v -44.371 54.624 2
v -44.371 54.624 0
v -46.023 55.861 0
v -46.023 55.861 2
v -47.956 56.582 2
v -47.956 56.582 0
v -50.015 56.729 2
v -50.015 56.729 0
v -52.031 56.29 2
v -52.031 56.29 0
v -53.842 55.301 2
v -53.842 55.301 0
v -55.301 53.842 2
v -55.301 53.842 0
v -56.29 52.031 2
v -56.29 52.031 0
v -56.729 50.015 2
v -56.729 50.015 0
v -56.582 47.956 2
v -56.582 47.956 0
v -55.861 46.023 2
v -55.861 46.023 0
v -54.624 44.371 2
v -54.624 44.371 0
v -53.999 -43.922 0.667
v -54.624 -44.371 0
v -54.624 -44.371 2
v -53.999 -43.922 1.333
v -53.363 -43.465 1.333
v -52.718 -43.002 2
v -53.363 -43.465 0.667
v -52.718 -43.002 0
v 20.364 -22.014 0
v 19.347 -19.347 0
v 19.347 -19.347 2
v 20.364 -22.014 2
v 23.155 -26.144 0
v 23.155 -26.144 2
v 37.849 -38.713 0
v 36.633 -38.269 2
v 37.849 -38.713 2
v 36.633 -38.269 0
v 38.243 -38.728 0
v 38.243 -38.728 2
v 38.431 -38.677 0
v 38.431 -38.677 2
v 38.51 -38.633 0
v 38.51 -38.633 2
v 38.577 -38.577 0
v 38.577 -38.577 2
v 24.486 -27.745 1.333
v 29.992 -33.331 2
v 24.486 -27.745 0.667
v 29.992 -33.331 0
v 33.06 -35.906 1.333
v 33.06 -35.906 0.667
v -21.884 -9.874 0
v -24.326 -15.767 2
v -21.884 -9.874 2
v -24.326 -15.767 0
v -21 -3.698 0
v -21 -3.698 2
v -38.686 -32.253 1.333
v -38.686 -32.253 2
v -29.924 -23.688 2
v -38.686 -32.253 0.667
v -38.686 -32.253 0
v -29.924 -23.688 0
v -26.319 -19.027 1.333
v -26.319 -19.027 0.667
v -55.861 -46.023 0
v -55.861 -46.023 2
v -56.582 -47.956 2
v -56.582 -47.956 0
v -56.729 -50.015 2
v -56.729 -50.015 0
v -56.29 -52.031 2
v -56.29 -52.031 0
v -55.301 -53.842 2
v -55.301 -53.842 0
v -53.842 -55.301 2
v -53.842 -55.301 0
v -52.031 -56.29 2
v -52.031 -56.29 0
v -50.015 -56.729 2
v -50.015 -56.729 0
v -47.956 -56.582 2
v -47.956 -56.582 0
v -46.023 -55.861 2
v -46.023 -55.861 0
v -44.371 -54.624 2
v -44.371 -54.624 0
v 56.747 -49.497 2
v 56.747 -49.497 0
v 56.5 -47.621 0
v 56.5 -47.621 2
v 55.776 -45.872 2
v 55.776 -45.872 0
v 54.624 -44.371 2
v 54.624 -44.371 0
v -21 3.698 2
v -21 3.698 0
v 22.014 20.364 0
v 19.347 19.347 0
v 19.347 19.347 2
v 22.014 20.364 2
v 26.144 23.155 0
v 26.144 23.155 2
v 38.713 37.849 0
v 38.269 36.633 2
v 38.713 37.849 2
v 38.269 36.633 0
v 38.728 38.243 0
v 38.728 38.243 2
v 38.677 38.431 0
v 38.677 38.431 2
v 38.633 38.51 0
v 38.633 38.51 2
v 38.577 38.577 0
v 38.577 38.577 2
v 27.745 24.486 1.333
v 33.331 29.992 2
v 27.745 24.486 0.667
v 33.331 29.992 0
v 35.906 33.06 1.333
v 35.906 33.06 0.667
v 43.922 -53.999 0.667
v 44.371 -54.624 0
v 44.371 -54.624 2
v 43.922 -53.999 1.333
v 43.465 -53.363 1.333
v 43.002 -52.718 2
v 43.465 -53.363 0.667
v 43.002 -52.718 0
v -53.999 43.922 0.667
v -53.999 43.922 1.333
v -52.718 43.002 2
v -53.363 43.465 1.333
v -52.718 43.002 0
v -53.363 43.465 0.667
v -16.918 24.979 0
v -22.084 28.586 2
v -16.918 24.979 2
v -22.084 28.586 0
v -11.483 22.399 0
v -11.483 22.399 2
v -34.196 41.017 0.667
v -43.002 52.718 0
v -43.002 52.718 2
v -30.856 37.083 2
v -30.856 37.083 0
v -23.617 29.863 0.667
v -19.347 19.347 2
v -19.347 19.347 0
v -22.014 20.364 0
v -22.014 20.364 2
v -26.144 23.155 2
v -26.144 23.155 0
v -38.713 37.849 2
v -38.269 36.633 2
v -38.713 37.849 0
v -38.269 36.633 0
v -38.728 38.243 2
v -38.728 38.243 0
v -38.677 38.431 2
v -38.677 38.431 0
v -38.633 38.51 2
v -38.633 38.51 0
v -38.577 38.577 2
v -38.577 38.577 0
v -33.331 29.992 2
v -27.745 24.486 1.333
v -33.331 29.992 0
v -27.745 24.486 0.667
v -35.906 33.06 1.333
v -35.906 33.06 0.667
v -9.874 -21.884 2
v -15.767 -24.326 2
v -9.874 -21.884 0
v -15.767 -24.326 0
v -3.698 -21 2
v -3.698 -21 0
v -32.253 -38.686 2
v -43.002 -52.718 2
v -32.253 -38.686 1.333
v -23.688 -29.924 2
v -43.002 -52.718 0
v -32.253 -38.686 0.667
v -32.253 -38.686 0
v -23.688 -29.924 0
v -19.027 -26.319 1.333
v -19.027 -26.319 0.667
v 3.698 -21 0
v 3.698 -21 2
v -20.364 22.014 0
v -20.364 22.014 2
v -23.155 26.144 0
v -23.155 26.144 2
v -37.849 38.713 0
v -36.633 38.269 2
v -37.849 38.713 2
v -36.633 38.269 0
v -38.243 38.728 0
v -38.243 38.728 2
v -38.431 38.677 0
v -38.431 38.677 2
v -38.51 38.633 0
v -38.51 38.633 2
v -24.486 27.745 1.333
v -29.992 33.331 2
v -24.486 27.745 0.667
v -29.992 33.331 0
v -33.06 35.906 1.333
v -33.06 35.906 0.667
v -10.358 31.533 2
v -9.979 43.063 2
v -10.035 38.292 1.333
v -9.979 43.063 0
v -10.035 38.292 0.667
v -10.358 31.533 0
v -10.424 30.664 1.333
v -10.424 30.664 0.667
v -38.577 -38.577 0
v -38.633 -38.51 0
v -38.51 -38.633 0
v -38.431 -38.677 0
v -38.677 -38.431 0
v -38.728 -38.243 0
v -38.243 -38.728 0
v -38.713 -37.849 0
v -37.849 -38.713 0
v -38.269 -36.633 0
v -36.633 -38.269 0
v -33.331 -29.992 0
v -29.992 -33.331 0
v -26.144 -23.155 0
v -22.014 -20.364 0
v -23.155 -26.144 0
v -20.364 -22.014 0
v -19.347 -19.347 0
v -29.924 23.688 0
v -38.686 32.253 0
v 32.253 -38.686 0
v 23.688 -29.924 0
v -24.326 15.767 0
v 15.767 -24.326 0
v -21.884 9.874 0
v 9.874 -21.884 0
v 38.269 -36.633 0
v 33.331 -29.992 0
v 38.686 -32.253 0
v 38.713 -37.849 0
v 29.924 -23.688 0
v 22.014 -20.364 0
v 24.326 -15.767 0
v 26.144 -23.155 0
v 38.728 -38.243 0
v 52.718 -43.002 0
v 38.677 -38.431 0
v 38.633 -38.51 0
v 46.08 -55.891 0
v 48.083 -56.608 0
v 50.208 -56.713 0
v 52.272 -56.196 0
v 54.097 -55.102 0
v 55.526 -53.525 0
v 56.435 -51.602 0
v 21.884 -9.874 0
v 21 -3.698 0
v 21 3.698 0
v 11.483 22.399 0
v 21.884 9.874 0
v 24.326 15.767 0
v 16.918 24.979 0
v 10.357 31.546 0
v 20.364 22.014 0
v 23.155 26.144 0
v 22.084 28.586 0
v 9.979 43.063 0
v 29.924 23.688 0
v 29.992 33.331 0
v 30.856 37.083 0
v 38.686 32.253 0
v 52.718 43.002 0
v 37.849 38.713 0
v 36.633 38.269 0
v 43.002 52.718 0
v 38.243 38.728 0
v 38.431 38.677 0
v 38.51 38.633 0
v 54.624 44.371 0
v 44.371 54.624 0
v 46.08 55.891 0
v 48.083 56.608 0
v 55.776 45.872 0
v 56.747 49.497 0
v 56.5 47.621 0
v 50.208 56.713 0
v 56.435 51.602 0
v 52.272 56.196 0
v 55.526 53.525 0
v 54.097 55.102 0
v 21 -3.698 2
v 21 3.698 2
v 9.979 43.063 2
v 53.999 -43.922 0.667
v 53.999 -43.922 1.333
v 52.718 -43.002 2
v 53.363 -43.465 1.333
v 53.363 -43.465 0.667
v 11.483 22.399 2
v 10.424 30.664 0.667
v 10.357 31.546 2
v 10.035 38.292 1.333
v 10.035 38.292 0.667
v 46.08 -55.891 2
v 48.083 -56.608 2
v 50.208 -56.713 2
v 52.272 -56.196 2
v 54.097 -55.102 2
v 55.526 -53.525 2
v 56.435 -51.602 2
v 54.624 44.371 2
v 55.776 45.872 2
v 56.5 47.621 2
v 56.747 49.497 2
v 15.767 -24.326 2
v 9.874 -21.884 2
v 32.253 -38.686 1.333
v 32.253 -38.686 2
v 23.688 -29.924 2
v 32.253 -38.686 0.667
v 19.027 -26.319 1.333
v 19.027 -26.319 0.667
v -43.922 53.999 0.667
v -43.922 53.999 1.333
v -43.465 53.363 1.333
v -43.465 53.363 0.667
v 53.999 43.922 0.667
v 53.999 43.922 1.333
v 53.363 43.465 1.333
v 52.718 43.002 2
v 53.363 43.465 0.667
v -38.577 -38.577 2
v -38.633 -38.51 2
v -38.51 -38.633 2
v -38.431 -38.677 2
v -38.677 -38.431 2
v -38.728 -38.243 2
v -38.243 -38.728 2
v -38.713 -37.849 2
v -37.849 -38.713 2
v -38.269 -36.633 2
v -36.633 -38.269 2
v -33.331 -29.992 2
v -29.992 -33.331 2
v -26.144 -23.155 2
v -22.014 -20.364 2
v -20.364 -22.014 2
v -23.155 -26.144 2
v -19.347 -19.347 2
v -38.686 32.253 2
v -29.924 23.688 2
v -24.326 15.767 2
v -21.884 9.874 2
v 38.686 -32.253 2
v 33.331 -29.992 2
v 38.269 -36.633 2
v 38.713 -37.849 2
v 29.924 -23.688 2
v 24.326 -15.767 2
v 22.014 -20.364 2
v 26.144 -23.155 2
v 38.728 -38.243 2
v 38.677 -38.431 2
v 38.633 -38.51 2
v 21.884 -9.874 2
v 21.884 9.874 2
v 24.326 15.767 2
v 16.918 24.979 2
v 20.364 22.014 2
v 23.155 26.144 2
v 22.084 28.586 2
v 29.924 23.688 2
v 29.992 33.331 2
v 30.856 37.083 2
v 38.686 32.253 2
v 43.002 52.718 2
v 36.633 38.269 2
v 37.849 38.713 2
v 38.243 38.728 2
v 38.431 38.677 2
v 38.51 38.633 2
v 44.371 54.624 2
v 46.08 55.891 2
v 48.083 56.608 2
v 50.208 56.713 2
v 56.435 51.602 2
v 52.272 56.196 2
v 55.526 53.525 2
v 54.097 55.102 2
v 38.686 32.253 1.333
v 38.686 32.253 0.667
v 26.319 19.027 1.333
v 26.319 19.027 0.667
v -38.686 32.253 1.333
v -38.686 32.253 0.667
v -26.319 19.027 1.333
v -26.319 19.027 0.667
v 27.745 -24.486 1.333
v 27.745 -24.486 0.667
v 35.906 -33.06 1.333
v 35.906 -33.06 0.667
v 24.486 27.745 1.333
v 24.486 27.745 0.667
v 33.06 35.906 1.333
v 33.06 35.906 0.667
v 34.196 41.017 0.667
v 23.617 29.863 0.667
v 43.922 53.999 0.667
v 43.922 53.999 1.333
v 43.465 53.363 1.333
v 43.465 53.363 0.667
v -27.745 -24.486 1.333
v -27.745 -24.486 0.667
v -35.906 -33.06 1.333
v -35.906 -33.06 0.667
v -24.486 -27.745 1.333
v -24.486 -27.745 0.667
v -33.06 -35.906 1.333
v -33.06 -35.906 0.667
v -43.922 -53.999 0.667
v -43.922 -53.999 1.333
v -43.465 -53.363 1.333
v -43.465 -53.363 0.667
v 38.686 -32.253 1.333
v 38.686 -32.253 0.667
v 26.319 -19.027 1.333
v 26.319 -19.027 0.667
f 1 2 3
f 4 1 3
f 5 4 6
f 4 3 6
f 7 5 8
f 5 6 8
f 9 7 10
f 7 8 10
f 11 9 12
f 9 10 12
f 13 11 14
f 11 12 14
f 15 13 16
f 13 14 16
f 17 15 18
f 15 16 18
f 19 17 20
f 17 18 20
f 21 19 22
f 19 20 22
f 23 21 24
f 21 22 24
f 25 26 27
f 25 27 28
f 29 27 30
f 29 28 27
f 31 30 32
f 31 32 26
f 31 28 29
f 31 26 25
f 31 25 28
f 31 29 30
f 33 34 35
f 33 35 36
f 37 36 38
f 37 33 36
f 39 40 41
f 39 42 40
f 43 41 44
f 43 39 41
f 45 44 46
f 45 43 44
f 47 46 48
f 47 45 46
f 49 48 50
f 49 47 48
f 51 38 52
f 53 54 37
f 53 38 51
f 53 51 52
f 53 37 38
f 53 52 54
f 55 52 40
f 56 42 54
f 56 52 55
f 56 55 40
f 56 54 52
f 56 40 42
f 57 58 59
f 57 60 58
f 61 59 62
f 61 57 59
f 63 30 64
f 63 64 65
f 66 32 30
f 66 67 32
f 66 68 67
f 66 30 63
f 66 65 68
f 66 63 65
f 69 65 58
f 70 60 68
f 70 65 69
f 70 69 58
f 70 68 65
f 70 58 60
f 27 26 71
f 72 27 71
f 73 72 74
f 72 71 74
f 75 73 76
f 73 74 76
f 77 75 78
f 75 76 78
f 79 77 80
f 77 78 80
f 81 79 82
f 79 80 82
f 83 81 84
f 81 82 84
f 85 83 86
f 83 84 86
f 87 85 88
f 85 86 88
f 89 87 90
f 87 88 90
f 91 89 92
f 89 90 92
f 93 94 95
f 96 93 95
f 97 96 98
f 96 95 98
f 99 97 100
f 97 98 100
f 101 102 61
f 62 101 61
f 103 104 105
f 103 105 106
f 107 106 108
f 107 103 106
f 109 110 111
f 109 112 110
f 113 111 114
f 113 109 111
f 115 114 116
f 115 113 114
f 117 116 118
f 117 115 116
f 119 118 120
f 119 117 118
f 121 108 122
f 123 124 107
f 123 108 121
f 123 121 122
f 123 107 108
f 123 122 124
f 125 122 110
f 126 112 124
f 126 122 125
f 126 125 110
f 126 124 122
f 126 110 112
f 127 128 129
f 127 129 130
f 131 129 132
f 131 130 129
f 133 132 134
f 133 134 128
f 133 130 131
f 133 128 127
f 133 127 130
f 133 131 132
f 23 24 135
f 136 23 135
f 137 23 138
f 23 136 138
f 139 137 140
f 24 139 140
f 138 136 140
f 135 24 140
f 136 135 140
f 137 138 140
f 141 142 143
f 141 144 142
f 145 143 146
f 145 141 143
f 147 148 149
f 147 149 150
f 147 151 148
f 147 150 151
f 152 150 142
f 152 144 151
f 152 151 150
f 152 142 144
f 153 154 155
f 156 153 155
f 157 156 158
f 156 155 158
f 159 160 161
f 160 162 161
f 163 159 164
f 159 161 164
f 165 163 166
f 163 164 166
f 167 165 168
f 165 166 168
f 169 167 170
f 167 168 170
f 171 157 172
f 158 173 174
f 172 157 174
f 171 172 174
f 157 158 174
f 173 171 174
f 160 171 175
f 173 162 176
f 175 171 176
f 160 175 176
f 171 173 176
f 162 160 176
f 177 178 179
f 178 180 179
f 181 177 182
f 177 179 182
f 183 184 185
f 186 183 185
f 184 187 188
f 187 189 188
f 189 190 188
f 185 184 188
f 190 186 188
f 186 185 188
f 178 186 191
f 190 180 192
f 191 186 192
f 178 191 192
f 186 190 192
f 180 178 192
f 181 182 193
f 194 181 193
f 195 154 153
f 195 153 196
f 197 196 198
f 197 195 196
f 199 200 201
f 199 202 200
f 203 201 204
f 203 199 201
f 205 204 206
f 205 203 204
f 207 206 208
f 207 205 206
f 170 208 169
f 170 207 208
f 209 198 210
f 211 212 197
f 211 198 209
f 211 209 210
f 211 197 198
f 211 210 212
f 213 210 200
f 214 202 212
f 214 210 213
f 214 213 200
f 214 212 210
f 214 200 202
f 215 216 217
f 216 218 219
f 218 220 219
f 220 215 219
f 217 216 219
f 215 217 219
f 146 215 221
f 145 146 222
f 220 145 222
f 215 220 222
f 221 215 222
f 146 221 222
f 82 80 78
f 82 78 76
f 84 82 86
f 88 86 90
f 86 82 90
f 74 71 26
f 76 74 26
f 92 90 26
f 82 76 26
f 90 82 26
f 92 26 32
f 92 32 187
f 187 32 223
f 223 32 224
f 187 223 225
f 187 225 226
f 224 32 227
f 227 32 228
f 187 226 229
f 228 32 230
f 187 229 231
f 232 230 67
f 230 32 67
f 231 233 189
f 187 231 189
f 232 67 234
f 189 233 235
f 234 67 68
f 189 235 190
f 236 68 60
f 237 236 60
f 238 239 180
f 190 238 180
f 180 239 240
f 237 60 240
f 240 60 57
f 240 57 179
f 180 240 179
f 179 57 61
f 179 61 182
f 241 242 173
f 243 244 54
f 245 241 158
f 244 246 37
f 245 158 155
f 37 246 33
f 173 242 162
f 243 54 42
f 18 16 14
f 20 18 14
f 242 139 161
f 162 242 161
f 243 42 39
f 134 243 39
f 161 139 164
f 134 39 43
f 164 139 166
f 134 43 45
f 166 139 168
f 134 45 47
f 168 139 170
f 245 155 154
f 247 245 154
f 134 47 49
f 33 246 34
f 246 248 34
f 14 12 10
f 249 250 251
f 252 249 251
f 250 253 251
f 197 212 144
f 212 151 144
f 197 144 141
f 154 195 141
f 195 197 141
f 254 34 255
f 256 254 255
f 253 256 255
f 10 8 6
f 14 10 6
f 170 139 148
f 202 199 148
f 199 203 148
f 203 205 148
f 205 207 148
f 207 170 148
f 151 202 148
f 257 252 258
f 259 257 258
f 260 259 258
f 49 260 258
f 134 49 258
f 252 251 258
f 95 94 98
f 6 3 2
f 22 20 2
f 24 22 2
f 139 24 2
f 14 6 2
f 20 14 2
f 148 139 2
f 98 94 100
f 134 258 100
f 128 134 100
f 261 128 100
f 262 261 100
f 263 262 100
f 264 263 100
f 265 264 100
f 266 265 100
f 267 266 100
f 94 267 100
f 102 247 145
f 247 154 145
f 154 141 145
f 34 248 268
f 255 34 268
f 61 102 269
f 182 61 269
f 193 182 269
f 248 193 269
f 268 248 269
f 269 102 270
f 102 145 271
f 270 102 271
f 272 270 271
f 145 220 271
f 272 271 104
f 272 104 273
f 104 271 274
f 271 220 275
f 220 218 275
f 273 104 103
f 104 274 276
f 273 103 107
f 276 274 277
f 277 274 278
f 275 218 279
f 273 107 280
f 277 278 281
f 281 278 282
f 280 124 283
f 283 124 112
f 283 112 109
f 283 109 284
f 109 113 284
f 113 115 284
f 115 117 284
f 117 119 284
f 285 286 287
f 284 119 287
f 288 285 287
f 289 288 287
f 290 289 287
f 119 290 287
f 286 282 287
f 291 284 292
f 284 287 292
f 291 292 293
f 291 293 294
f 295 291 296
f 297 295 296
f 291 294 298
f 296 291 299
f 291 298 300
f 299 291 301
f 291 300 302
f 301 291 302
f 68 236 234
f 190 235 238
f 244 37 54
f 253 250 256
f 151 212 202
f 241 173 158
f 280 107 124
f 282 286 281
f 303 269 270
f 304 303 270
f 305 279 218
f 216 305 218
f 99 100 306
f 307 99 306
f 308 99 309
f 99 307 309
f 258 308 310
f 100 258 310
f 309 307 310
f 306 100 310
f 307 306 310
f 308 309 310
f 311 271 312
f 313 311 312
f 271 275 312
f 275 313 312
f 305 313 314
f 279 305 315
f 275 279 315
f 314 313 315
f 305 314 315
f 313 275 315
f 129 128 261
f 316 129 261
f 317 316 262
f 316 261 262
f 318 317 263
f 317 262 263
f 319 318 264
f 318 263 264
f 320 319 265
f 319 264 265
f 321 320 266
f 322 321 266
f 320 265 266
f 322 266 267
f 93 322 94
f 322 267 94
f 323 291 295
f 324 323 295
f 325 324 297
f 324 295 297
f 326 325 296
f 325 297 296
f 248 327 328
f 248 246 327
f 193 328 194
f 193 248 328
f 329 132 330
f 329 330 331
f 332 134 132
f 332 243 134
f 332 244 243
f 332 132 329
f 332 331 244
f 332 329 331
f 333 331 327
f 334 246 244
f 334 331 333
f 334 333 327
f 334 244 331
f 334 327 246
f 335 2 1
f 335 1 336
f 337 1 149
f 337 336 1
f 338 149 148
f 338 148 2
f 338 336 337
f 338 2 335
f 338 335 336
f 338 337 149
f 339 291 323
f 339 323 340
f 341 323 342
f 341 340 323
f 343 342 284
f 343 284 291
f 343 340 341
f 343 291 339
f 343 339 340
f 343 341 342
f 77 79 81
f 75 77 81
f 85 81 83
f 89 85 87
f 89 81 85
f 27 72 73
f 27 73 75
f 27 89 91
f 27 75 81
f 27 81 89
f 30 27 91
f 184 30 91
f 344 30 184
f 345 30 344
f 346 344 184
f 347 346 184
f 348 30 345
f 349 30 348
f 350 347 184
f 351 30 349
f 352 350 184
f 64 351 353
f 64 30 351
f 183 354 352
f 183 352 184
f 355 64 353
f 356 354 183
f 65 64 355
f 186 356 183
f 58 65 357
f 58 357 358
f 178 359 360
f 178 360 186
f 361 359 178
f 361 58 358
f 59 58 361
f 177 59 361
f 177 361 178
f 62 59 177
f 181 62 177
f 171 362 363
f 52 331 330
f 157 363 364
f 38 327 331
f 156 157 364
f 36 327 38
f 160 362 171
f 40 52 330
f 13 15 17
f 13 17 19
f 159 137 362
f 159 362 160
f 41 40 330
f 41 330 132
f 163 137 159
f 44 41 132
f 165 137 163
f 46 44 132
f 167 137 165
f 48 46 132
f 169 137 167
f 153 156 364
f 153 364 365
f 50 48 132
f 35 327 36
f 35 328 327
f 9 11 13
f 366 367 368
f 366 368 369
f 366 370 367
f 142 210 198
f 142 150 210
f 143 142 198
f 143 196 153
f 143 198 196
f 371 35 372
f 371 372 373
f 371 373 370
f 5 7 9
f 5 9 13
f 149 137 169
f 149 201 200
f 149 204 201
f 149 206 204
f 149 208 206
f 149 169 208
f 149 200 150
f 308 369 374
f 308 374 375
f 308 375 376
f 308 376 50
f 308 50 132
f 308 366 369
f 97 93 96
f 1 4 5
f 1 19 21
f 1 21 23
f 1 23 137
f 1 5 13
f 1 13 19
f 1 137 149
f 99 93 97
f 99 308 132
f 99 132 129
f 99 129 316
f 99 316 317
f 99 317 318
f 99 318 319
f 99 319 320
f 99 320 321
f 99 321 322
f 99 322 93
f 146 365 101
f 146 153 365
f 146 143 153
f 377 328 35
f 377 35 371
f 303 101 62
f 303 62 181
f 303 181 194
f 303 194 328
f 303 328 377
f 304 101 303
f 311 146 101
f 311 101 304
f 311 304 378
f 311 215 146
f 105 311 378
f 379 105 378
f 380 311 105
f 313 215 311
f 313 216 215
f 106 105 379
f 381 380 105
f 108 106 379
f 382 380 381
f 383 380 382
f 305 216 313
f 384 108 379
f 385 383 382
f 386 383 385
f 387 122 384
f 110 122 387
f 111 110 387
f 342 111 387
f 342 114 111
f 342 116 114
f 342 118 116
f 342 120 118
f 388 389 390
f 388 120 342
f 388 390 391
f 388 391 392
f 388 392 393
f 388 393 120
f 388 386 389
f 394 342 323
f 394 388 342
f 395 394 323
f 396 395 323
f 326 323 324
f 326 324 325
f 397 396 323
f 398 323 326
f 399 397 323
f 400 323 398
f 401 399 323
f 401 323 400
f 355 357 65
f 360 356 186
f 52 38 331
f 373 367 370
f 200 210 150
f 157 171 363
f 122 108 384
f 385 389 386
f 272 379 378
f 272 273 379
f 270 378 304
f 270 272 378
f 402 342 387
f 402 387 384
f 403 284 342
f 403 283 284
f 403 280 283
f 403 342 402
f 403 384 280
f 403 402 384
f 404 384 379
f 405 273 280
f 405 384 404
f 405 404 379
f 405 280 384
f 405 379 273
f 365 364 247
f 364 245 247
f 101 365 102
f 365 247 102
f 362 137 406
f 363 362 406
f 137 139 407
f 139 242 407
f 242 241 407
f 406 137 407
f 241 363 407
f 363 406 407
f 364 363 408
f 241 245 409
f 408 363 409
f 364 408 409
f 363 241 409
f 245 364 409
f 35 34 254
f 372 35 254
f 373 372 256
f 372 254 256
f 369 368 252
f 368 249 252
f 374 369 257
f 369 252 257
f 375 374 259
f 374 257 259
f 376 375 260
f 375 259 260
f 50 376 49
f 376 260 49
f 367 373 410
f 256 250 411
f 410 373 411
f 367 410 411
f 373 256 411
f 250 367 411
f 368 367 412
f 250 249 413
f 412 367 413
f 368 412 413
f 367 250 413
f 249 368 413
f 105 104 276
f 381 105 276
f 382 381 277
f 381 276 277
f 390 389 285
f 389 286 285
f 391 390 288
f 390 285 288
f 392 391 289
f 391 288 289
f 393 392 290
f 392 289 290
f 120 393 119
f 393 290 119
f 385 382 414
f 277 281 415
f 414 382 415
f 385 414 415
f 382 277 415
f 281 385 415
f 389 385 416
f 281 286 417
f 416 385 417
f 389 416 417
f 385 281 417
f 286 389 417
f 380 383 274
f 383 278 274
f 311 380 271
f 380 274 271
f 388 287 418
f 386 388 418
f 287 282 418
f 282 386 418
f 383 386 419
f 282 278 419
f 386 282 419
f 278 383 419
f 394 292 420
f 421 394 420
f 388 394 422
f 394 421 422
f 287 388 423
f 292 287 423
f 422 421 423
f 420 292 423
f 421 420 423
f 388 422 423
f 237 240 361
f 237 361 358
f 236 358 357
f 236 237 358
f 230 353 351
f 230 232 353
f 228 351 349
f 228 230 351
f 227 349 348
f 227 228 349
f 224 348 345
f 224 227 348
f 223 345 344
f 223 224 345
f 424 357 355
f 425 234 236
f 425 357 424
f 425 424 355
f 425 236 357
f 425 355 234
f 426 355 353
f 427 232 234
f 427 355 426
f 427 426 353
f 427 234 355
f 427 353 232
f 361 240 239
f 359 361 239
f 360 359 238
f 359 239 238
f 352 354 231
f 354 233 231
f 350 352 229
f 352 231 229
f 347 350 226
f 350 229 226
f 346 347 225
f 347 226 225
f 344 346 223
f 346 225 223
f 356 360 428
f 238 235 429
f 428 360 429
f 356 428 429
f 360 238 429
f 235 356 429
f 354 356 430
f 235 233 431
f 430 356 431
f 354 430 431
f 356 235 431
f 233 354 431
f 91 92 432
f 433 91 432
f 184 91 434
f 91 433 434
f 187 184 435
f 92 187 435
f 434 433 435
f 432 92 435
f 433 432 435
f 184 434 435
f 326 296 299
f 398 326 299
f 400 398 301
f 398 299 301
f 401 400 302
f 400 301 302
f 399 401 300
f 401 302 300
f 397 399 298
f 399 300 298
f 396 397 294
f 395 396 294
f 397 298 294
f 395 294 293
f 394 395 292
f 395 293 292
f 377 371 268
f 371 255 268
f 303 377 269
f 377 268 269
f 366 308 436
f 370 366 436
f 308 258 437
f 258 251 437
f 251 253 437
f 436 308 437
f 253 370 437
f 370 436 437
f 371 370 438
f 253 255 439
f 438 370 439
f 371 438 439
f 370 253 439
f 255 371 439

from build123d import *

# Parameters (mm, degrees)
F1_DEPTH = 2


with BuildPart() as f1:
    # F0 (on Top) → F1 (new body)
    with BuildSketch(Plane.XY):
        with BuildLine():
            Line((-54.6239988467, 44.3709505195), (-44.3709505195, 54.6239988467))
            ThreePointArc((-44.3709505195, 54.6239988467), (-54.6239988467, 54.6239988467), (-54.6239988467, 44.3709505195))
        make_face()
        with BuildLine():
            add(Edge.make_bspline(
                [(-44.3709505195, 54.6239988467), (-43.9252914894, 54.0043111509), (-43.4688364543, 53.3678190196), (-43.0017926599, 52.7175080764)],
                knots=[0, 0, 0, 0, 2.5015216892, 2.5015216892, 2.5015216892, 2.5015216892], degree=3))
            Line((-44.3709505195, 54.6239988467), (-54.6239988467, 44.3709505195))
            add(Edge.make_bspline(
                [(-54.6239988467, 44.3709505195), (-54.0043111509, 43.9252914894), (-53.3678190196, 43.4688364543), (-52.7175080764, 43.0017926599)],
                knots=[0, 0, 0, 0, 2.5015216892, 2.5015216892, 2.5015216892, 2.5015216892], degree=3))
            ThreePointArc((-52.7175080764, 43.0017926599), (-45.6753510653, 43.3368033681), (-42.2474746831, 49.4974746831))
            ThreePointArc((-42.2474746831, 49.4974746831), (-42.438572691, 51.1510776179), (-43.0017926599, 52.7175080764))
        make_face()
        with BuildLine():
            add(Edge.make_bspline(
                [(-43.0017926599, 52.7175080764), (-35.156058263, 41.793121548), (-24.322210487, 26.9691113568), (-11.4827054753, 22.3989517485)],
                knots=[2.5015216892, 2.5015216892, 2.5015216892, 2.5015216892, 44.5238651926, 44.5238651926, 44.5238651926, 44.5238651926], degree=3))
            ThreePointArc((-43.0017926599, 52.7175080764), (-42.438572691, 51.1510776179), (-42.2474746831, 49.4974746831))
            ThreePointArc((-42.2474746831, 49.4974746831), (-45.6753510653, 43.3368033681), (-52.7175080764, 43.0017926599))
            add(Edge.make_bspline(
                [(-52.7175080764, 43.0017926599), (-39.6490365505, 33.6162078218), (-21, 19.9544767567), (-21, 3.6984848098)],
                knots=[2.5015216892, 2.5015216892, 2.5015216892, 2.5015216892, 52.7714199671, 52.7714199671, 52.7714199671, 52.7714199671], degree=3))
            Line((-21, 3.6984848098), (-21, 8.6984848098))
            Line((-21, 8.6984848098), (-13.1504285381, 16.5480562717))
            add(Edge.make_bspline(
                [(-11.4827054763, 22.3989517466), (-11.9073939206, 20.1841898293), (-12.4520123835, 18.1588898334), (-13.1504285381, 16.5480562717)],
                knots=[20.823803079, 20.823803079, 20.823803079, 20.823803079, 26.7043470991, 26.7043470991, 26.7043470991, 26.7043470991], degree=3))
        make_face()
        with BuildLine():
            add(Edge.make_bspline(
                [(-19.3470806403, 19.3470806403), (-20.6042841596, 26.1135079486), (-36.7534501997, 40.4009415356), (-38.5771958677, 38.5771958677)],
                knots=[0, 0, 0, 0, 27.1954897606, 27.1954897606, 27.1954897606, 27.1954897606], degree=3))
            add(Edge.make_bspline(
                [(-19.3470806403, 19.3470806403), (-26.1135079486, 20.6042841596), (-40.4009415356, 36.7534501997), (-38.5771958677, 38.5771958677)],
                knots=[0, 0, 0, 0, 27.1954897606, 27.1954897606, 27.1954897606, 27.1954897606], degree=3))
        make_face(mode=Mode.SUBTRACT)
        with BuildLine():
            add(Edge.make_bspline(
                [(-9.9788261577, 43.0633931983), (-9.9788261577, 40.4602801443), (-9.9788261577, 30.2417237545), (-11.4827054763, 22.3989517466)],
                knots=[0, 0, 0, 0, 20.823803079, 20.823803079, 20.823803079, 20.823803079], degree=3))
            add(Edge.make_bspline(
                [(-11.4827054753, 22.3989517485), (-8.9627479471, 21.5019850743), (-6.3655318616, 21), (-3.6984848098, 21)],
                knots=[44.5238651926, 44.5238651926, 44.5238651926, 44.5238651926, 52.7714199671, 52.7714199671, 52.7714199671, 52.7714199671], degree=3))
            Line((-3.6984848098, 21), (3.6984848098, 21))
            add(Edge.make_bspline(
                [(11.4827054753, 22.3989517485), (8.9627479471, 21.5019850743), (6.3655318616, 21), (3.6984848098, 21)],
                knots=[44.5238651926, 44.5238651926, 44.5238651926, 44.5238651926, 52.7714199671, 52.7714199671, 52.7714199671, 52.7714199671], degree=3))
            add(Edge.make_bspline(
                [(9.9788261577, 43.0633931983), (9.9788261577, 40.4602801443), (9.9788261577, 30.2417237545), (11.4827054763, 22.3989517466)],
                knots=[0, 0, 0, 0, 20.823803079, 20.823803079, 20.823803079, 20.823803079], degree=3))
            Line((9.9788261577, 43.0633931983), (-9.9788261577, 43.0633931983))
        make_face()
        with BuildLine():
            add(Edge.make_bspline(
                [(-11.4827054753, 22.3989517485), (-8.9627479471, 21.5019850743), (-6.3655318616, 21), (-3.6984848098, 21)],
                knots=[44.5238651926, 44.5238651926, 44.5238651926, 44.5238651926, 52.7714199671, 52.7714199671, 52.7714199671, 52.7714199671], degree=3))
            add(Edge.make_bspline(
                [(-11.4827054763, 22.3989517466), (-11.9073939206, 20.1841898293), (-12.4520123835, 18.1588898334), (-13.1504285381, 16.5480562717)],
                knots=[20.823803079, 20.823803079, 20.823803079, 20.823803079, 26.7043470991, 26.7043470991, 26.7043470991, 26.7043470991], degree=3))
            Line((-13.1504285381, 16.5480562717), (-8.6984848098, 21))
            Line((-8.6984848098, 21), (-3.6984848098, 21))
        make_face()
        Polygon((-21, 8.6984848098), (-21, 3.6984848098), (-21, -3.6984848098), (-21, -8.6984848098), (-8.6984848098, -21), (-3.6984848098, -21), (3.6984848098, -21), (8.6984848098, -21), (21, -8.6984848098), (21, -3.6984848098), (21, 3.6984848098), (21, 8.6984848098), (13.1504285381, 16.5480562717), (8.6984848098, 21), (3.6984848098, 21), (-3.6984848098, 21), (-8.6984848098, 21), (-13.1504285381, 16.5480562717), align=None)
        with BuildLine():
            add(Edge.make_bspline(
                [(11.4827054753, 22.3989517485), (8.9627479471, 21.5019850743), (6.3655318616, 21), (3.6984848098, 21)],
                knots=[44.5238651926, 44.5238651926, 44.5238651926, 44.5238651926, 52.7714199671, 52.7714199671, 52.7714199671, 52.7714199671], degree=3))
            Line((3.6984848098, 21), (8.6984848098, 21))
            Line((8.6984848098, 21), (13.1504285381, 16.5480562717))
            add(Edge.make_bspline(
                [(11.4827054763, 22.3989517466), (11.9073939206, 20.1841898293), (12.4520123835, 18.1588898334), (13.1504285381, 16.5480562717)],
                knots=[20.823803079, 20.823803079, 20.823803079, 20.823803079, 26.7043470991, 26.7043470991, 26.7043470991, 26.7043470991], degree=3))
        make_face()
        with BuildLine():
            add(Edge.make_bspline(
                [(43.0017926599, 52.7175080764), (35.156058263, 41.793121548), (24.322210487, 26.9691113568), (11.4827054753, 22.3989517485)],
                knots=[2.5015216892, 2.5015216892, 2.5015216892, 2.5015216892, 44.5238651926, 44.5238651926, 44.5238651926, 44.5238651926], degree=3))
            add(Edge.make_bspline(
                [(11.4827054763, 22.3989517466), (11.9073939206, 20.1841898293), (12.4520123835, 18.1588898334), (13.1504285381, 16.5480562717)],
                knots=[20.823803079, 20.823803079, 20.823803079, 20.823803079, 26.7043470991, 26.7043470991, 26.7043470991, 26.7043470991], degree=3))
            Line((13.1504285381, 16.5480562717), (21, 8.6984848098))
            Line((21, 8.6984848098), (21, 3.6984848098))
            add(Edge.make_bspline(
                [(52.7175080764, 43.0017926599), (39.6490365505, 33.6162078218), (21, 19.9544767567), (21, 3.6984848098)],
                knots=[2.5015216892, 2.5015216892, 2.5015216892, 2.5015216892, 52.7714199671, 52.7714199671, 52.7714199671, 52.7714199671], degree=3))
            ThreePointArc((52.7175080764, 43.0017926599), (44.3709505195, 44.3709505195), (43.0017926599, 52.7175080764))
        make_face()
        with BuildLine():
            add(Edge.make_bspline(
                [(19.3470806403, 19.3470806403), (26.1135079486, 20.6042841596), (40.4009415356, 36.7534501997), (38.5771958677, 38.5771958677)],
                knots=[0, 0, 0, 0, 27.1954897606, 27.1954897606, 27.1954897606, 27.1954897606], degree=3))
            add(Edge.make_bspline(
                [(19.3470806403, 19.3470806403), (20.6042841596, 26.1135079486), (36.7534501997, 40.4009415356), (38.5771958677, 38.5771958677)],
                knots=[0, 0, 0, 0, 27.1954897606, 27.1954897606, 27.1954897606, 27.1954897606], degree=3))
        make_face(mode=Mode.SUBTRACT)
        with BuildLine():
            add(Edge.make_bspline(
                [(44.3709505195, 54.6239988467), (43.9252914894, 54.0043111509), (43.4688364543, 53.3678190196), (43.0017926599, 52.7175080764)],
                knots=[0, 0, 0, 0, 2.5015216892, 2.5015216892, 2.5015216892, 2.5015216892], degree=3))
            ThreePointArc((43.0017926599, 52.7175080764), (44.3709505195, 44.3709505195), (52.7175080764, 43.0017926599))
            add(Edge.make_bspline(
                [(54.6239988467, 44.3709505195), (54.0043111509, 43.9252914894), (53.3678190196, 43.4688364543), (52.7175080764, 43.0017926599)],
                knots=[0, 0, 0, 0, 2.5015216892, 2.5015216892, 2.5015216892, 2.5015216892], degree=3))
            ThreePointArc((54.6239988467, 44.3709505195), (56.1956012938, 46.7230197984), (56.7474746831, 49.4974746831))
            ThreePointArc((56.7474746831, 49.4974746831), (52.2719295677, 56.1956012938), (44.3709505195, 54.6239988467))
        make_face()
        with BuildLine():
            Line((8.6984848098, -21), (3.6984848098, -21))
            add(Edge.make_bspline(
                [(43.0017926599, -52.7175080764), (33.6162078218, -39.6490365505), (19.9544767567, -21), (3.6984848098, -21)],
                knots=[2.5015216892, 2.5015216892, 2.5015216892, 2.5015216892, 52.7714199671, 52.7714199671, 52.7714199671, 52.7714199671], degree=3))
            ThreePointArc((43.0017926599, -52.7175080764), (44.3709505195, -44.3709505195), (52.7175080764, -43.0017926599))
            add(Edge.make_bspline(
                [(52.7175080764, -43.0017926599), (39.6490365505, -33.6162078218), (21, -19.9544767567), (21, -3.6984848098)],
                knots=[2.5015216892, 2.5015216892, 2.5015216892, 2.5015216892, 52.7714199671, 52.7714199671, 52.7714199671, 52.7714199671], degree=3))
            Line((21, -3.6984848098), (21, -8.6984848098))
            Line((21, -8.6984848098), (8.6984848098, -21))
        make_face()
        with BuildLine():
            add(Edge.make_bspline(
                [(19.3470806403, -19.3470806403), (20.6042841596, -26.1135079486), (36.7534501997, -40.4009415356), (38.5771958677, -38.5771958677)],
                knots=[0, 0, 0, 0, 27.1954897606, 27.1954897606, 27.1954897606, 27.1954897606], degree=3))
            add(Edge.make_bspline(
                [(19.3470806403, -19.3470806403), (26.1135079486, -20.6042841596), (40.4009415356, -36.7534501997), (38.5771958677, -38.5771958677)],
                knots=[0, 0, 0, 0, 27.1954897606, 27.1954897606, 27.1954897606, 27.1954897606], degree=3))
        make_face(mode=Mode.SUBTRACT)
        with BuildLine():
            Line((-21, -8.6984848098), (-21, -3.6984848098))
            add(Edge.make_bspline(
                [(-52.7175080764, -43.0017926599), (-39.6490365505, -33.6162078218), (-21, -19.9544767567), (-21, -3.6984848098)],
                knots=[2.5015216892, 2.5015216892, 2.5015216892, 2.5015216892, 52.7714199671, 52.7714199671, 52.7714199671, 52.7714199671], degree=3))
            ThreePointArc((-52.7175080764, -43.0017926599), (-45.6753510653, -43.3368033681), (-42.2474746831, -49.4974746831))
            ThreePointArc((-42.2474746831, -49.4974746831), (-42.438572691, -51.1510776179), (-43.0017926599, -52.7175080764))
            add(Edge.make_bspline(
                [(-43.0017926599, -52.7175080764), (-33.6162078218, -39.6490365505), (-19.9544767567, -21), (-3.6984848098, -21)],
                knots=[2.5015216892, 2.5015216892, 2.5015216892, 2.5015216892, 52.7714199671, 52.7714199671, 52.7714199671, 52.7714199671], degree=3))
            Line((-3.6984848098, -21), (-8.6984848098, -21))
            Line((-8.6984848098, -21), (-21, -8.6984848098))
        make_face()
        with BuildLine():
            add(Edge.make_bspline(
                [(-19.3470806403, -19.3470806403), (-26.1135079486, -20.6042841596), (-40.4009415356, -36.7534501997), (-38.5771958677, -38.5771958677)],
                knots=[0, 0, 0, 0, 27.1954897606, 27.1954897606, 27.1954897606, 27.1954897606], degree=3))
            add(Edge.make_bspline(
                [(-19.3470806403, -19.3470806403), (-20.6042841596, -26.1135079486), (-36.7534501997, -40.4009415356), (-38.5771958677, -38.5771958677)],
                knots=[0, 0, 0, 0, 27.1954897606, 27.1954897606, 27.1954897606, 27.1954897606], degree=3))
        make_face(mode=Mode.SUBTRACT)
        with BuildLine():
            ThreePointArc((-42.2474746831, -49.4974746831), (-45.6753510653, -43.3368033681), (-52.7175080764, -43.0017926599))
            add(Edge.make_bspline(
                [(-54.6239988467, -44.3709505195), (-54.0043111509, -43.9252914894), (-53.3678190196, -43.4688364543), (-52.7175080764, -43.0017926599)],
                knots=[0, 0, 0, 0, 2.5015216892, 2.5015216892, 2.5015216892, 2.5015216892], degree=3))
            ThreePointArc((-54.6239988467, -44.3709505195), (-54.6239988467, -54.6239988467), (-44.3709505195, -54.6239988467))
            add(Edge.make_bspline(
                [(-44.3709505195, -54.6239988467), (-43.9252914894, -54.0043111509), (-43.4688364543, -53.3678190196), (-43.0017926599, -52.7175080764)],
                knots=[0, 0, 0, 0, 2.5015216892, 2.5015216892, 2.5015216892, 2.5015216892], degree=3))
            ThreePointArc((-43.0017926599, -52.7175080764), (-42.438572691, -51.1510776179), (-42.2474746831, -49.4974746831))
        make_face()
        with BuildLine():
            ThreePointArc((52.7175080764, -43.0017926599), (44.3709505195, -44.3709505195), (43.0017926599, -52.7175080764))
            add(Edge.make_bspline(
                [(44.3709505195, -54.6239988467), (43.9252914894, -54.0043111509), (43.4688364543, -53.3678190196), (43.0017926599, -52.7175080764)],
                knots=[0, 0, 0, 0, 2.5015216892, 2.5015216892, 2.5015216892, 2.5015216892], degree=3))
            ThreePointArc((44.3709505195, -54.6239988467), (52.2719295677, -56.1956012938), (56.7474746831, -49.4974746831))
            ThreePointArc((56.7474746831, -49.4974746831), (56.1956012938, -46.7230197984), (54.6239988467, -44.3709505195))
            add(Edge.make_bspline(
                [(54.6239988467, -44.3709505195), (54.0043111509, -43.9252914894), (53.3678190196, -43.4688364543), (52.7175080764, -43.0017926599)],
                knots=[0, 0, 0, 0, 2.5015216892, 2.5015216892, 2.5015216892, 2.5015216892], degree=3))
        make_face()
    extrude(amount=F1_DEPTH)


solid = f1.part
